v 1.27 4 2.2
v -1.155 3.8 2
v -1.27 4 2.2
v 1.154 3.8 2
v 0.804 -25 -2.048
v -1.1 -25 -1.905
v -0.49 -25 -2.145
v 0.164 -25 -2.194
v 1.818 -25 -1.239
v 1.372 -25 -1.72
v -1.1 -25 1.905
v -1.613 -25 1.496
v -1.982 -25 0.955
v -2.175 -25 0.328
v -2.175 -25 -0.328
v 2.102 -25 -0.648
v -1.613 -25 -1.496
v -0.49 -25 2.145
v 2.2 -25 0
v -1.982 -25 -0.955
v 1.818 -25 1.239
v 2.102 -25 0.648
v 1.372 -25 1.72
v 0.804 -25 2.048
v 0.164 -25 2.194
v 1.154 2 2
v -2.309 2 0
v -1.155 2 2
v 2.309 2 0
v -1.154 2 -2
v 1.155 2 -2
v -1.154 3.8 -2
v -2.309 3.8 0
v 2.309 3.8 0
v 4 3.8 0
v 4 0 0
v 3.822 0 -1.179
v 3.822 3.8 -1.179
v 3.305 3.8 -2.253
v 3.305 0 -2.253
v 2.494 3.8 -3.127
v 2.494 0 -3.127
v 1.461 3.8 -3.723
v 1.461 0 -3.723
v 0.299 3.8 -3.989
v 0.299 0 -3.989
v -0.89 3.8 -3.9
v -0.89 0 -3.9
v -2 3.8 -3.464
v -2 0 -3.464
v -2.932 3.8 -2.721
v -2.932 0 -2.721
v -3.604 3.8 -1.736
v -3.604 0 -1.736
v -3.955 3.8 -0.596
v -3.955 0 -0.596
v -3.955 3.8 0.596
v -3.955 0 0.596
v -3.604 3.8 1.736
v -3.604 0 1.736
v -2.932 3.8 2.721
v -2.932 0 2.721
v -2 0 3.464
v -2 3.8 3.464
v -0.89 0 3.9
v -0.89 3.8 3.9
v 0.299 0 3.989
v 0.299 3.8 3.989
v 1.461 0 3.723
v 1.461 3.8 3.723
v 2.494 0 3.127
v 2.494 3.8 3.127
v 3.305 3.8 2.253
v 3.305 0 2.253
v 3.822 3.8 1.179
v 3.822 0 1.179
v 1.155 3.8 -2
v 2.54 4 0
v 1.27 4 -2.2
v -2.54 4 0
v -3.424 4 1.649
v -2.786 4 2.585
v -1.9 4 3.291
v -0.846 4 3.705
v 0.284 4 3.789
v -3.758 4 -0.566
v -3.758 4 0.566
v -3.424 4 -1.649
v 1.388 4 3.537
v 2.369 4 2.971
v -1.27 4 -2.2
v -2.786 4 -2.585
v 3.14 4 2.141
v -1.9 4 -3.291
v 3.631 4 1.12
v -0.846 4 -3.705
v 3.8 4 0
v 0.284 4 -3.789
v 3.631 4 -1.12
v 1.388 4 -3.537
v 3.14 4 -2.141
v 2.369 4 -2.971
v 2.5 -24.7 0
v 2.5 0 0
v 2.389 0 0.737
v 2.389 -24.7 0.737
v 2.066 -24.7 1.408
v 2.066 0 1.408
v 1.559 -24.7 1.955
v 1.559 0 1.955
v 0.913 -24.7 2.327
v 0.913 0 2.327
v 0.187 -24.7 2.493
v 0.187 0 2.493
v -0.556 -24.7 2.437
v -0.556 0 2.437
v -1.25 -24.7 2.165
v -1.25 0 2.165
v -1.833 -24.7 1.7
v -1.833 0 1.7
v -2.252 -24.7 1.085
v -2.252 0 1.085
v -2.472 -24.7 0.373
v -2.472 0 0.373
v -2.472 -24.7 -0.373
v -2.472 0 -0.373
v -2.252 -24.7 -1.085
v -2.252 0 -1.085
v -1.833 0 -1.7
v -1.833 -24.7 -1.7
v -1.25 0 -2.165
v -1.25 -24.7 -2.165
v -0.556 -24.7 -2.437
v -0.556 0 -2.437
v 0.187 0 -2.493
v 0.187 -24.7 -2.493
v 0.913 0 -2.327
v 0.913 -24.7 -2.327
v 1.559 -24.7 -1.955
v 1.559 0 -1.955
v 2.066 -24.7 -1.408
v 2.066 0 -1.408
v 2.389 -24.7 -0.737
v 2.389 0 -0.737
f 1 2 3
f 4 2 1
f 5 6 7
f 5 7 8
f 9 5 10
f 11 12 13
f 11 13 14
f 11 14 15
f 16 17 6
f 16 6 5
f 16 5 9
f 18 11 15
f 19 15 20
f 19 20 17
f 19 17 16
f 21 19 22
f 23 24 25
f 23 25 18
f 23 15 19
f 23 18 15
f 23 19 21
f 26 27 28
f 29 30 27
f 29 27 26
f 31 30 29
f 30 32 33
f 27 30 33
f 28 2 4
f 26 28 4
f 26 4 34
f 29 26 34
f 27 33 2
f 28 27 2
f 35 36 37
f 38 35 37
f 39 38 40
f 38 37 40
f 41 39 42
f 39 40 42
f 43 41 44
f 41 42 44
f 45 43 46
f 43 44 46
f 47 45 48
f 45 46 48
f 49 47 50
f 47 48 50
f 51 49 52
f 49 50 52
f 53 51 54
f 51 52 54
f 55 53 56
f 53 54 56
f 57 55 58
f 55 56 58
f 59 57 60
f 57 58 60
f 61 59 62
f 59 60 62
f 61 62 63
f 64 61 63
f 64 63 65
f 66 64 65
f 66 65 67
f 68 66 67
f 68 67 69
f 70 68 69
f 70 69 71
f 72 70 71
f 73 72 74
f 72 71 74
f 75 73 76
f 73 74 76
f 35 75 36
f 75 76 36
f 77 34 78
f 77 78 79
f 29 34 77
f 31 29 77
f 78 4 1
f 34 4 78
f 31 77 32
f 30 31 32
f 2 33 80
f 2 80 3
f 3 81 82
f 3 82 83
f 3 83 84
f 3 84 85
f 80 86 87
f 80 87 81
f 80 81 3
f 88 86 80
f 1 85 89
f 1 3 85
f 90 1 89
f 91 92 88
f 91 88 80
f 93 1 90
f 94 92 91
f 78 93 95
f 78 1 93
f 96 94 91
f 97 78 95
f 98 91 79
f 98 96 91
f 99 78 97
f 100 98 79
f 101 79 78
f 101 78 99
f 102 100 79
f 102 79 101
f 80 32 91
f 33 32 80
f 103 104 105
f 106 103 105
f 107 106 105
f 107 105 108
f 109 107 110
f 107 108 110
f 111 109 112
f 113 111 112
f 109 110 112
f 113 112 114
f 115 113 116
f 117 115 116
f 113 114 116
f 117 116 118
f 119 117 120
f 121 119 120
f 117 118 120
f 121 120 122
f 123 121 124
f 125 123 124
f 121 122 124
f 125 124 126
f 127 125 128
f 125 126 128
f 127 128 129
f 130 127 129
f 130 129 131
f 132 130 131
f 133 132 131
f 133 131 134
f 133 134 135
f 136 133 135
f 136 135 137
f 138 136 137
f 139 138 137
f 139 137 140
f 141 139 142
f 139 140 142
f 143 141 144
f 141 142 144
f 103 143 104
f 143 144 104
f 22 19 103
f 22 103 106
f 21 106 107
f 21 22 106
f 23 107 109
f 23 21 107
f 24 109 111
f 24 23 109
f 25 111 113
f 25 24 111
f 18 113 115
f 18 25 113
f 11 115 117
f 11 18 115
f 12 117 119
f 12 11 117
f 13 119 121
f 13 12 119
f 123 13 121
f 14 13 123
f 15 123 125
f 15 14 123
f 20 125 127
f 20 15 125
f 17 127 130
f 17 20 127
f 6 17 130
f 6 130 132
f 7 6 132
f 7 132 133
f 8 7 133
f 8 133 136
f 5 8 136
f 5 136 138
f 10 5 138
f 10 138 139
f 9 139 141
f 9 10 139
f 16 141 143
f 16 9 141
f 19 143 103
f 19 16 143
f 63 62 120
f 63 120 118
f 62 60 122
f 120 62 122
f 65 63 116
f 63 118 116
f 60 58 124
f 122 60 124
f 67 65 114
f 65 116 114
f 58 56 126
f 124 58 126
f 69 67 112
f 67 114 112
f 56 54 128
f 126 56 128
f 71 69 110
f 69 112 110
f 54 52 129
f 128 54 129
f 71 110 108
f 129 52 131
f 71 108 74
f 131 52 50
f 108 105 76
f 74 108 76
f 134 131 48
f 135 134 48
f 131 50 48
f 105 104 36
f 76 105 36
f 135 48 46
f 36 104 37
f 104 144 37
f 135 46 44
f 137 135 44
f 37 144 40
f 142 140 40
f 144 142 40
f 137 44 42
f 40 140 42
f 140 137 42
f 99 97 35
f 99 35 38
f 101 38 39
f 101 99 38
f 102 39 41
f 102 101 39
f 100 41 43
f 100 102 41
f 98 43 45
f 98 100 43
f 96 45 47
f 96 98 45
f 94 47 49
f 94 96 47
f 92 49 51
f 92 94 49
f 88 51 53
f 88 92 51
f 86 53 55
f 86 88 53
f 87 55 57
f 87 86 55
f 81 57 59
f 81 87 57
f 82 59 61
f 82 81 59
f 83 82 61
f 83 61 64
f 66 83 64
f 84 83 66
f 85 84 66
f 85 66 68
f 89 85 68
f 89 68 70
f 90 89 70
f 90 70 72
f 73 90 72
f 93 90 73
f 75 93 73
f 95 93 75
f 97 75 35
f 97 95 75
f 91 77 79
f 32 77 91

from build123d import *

# Parameters (mm, degrees)
SKETCH_1_R          = 4
EXTRUDE_1_DEPTH     = 4
SKETCH_2_R          = 2.5
EXTRUDE_2_DEPTH     = 25
CUT_EXTRUDE_1_DEPTH = 2
CHAMFER_1_SIZE      = 0.2
CHAMFER_2_SIZE      = 0.3


with BuildPart() as part:
    # 草图1 → 凸台-拉伸1 (new body)
    with BuildSketch(Plane(origin=(0, 0, 0), x_dir=(1, 0, 0), z_dir=(0, 1, 0))):
        Circle(SKETCH_1_R)
    extrude(amount=EXTRUDE_1_DEPTH)

    # 草图2 → 凸台-拉伸2 (add)
    with BuildSketch(Plane.XZ):
        Circle(SKETCH_2_R)
    extrude(amount=EXTRUDE_2_DEPTH)

    # 草图11 → 切除-拉伸1 (cut)
    with BuildSketch(Plane(origin=(0, 4, 0), x_dir=(1, 0, 0), z_dir=(0, 1, 0))):
        Polygon((1.154954177, 1.999853541), (-1.154446882, 2.000146427), (-2.309401058, 0.000292887), (-1.154954177, -1.999853541), (1.154446882, -2.000146427), (2.309401058, -0.000292887), align=None)
    extrude(amount=-CUT_EXTRUDE_1_DEPTH, mode=Mode.SUBTRACT)

    # 倒角1
    chamfer_1_edges = [part.edges().sort_by_distance(p)[0] for p in [
        (1.732177617, 4, -0.999780327),
        (0.000253647, 4, -1.999999984),
        (-1.73192397, 4, -1.000219657),
        (-1.732177617, 4, 0.999780327),
        (-0.000253647, 4, 1.999999984),
        (1.73192397, 4, 1.000219657),
        (-4, 4, 0),
    ]]
    chamfer(chamfer_1_edges, length=CHAMFER_1_SIZE)

    # 倒角2
    chamfer_2_edges = [part.edges().sort_by_distance(p)[0] for p in [
        (-2.5, -25, 0),
    ]]
    chamfer(chamfer_2_edges, length=CHAMFER_2_SIZE)


solid = part.part
